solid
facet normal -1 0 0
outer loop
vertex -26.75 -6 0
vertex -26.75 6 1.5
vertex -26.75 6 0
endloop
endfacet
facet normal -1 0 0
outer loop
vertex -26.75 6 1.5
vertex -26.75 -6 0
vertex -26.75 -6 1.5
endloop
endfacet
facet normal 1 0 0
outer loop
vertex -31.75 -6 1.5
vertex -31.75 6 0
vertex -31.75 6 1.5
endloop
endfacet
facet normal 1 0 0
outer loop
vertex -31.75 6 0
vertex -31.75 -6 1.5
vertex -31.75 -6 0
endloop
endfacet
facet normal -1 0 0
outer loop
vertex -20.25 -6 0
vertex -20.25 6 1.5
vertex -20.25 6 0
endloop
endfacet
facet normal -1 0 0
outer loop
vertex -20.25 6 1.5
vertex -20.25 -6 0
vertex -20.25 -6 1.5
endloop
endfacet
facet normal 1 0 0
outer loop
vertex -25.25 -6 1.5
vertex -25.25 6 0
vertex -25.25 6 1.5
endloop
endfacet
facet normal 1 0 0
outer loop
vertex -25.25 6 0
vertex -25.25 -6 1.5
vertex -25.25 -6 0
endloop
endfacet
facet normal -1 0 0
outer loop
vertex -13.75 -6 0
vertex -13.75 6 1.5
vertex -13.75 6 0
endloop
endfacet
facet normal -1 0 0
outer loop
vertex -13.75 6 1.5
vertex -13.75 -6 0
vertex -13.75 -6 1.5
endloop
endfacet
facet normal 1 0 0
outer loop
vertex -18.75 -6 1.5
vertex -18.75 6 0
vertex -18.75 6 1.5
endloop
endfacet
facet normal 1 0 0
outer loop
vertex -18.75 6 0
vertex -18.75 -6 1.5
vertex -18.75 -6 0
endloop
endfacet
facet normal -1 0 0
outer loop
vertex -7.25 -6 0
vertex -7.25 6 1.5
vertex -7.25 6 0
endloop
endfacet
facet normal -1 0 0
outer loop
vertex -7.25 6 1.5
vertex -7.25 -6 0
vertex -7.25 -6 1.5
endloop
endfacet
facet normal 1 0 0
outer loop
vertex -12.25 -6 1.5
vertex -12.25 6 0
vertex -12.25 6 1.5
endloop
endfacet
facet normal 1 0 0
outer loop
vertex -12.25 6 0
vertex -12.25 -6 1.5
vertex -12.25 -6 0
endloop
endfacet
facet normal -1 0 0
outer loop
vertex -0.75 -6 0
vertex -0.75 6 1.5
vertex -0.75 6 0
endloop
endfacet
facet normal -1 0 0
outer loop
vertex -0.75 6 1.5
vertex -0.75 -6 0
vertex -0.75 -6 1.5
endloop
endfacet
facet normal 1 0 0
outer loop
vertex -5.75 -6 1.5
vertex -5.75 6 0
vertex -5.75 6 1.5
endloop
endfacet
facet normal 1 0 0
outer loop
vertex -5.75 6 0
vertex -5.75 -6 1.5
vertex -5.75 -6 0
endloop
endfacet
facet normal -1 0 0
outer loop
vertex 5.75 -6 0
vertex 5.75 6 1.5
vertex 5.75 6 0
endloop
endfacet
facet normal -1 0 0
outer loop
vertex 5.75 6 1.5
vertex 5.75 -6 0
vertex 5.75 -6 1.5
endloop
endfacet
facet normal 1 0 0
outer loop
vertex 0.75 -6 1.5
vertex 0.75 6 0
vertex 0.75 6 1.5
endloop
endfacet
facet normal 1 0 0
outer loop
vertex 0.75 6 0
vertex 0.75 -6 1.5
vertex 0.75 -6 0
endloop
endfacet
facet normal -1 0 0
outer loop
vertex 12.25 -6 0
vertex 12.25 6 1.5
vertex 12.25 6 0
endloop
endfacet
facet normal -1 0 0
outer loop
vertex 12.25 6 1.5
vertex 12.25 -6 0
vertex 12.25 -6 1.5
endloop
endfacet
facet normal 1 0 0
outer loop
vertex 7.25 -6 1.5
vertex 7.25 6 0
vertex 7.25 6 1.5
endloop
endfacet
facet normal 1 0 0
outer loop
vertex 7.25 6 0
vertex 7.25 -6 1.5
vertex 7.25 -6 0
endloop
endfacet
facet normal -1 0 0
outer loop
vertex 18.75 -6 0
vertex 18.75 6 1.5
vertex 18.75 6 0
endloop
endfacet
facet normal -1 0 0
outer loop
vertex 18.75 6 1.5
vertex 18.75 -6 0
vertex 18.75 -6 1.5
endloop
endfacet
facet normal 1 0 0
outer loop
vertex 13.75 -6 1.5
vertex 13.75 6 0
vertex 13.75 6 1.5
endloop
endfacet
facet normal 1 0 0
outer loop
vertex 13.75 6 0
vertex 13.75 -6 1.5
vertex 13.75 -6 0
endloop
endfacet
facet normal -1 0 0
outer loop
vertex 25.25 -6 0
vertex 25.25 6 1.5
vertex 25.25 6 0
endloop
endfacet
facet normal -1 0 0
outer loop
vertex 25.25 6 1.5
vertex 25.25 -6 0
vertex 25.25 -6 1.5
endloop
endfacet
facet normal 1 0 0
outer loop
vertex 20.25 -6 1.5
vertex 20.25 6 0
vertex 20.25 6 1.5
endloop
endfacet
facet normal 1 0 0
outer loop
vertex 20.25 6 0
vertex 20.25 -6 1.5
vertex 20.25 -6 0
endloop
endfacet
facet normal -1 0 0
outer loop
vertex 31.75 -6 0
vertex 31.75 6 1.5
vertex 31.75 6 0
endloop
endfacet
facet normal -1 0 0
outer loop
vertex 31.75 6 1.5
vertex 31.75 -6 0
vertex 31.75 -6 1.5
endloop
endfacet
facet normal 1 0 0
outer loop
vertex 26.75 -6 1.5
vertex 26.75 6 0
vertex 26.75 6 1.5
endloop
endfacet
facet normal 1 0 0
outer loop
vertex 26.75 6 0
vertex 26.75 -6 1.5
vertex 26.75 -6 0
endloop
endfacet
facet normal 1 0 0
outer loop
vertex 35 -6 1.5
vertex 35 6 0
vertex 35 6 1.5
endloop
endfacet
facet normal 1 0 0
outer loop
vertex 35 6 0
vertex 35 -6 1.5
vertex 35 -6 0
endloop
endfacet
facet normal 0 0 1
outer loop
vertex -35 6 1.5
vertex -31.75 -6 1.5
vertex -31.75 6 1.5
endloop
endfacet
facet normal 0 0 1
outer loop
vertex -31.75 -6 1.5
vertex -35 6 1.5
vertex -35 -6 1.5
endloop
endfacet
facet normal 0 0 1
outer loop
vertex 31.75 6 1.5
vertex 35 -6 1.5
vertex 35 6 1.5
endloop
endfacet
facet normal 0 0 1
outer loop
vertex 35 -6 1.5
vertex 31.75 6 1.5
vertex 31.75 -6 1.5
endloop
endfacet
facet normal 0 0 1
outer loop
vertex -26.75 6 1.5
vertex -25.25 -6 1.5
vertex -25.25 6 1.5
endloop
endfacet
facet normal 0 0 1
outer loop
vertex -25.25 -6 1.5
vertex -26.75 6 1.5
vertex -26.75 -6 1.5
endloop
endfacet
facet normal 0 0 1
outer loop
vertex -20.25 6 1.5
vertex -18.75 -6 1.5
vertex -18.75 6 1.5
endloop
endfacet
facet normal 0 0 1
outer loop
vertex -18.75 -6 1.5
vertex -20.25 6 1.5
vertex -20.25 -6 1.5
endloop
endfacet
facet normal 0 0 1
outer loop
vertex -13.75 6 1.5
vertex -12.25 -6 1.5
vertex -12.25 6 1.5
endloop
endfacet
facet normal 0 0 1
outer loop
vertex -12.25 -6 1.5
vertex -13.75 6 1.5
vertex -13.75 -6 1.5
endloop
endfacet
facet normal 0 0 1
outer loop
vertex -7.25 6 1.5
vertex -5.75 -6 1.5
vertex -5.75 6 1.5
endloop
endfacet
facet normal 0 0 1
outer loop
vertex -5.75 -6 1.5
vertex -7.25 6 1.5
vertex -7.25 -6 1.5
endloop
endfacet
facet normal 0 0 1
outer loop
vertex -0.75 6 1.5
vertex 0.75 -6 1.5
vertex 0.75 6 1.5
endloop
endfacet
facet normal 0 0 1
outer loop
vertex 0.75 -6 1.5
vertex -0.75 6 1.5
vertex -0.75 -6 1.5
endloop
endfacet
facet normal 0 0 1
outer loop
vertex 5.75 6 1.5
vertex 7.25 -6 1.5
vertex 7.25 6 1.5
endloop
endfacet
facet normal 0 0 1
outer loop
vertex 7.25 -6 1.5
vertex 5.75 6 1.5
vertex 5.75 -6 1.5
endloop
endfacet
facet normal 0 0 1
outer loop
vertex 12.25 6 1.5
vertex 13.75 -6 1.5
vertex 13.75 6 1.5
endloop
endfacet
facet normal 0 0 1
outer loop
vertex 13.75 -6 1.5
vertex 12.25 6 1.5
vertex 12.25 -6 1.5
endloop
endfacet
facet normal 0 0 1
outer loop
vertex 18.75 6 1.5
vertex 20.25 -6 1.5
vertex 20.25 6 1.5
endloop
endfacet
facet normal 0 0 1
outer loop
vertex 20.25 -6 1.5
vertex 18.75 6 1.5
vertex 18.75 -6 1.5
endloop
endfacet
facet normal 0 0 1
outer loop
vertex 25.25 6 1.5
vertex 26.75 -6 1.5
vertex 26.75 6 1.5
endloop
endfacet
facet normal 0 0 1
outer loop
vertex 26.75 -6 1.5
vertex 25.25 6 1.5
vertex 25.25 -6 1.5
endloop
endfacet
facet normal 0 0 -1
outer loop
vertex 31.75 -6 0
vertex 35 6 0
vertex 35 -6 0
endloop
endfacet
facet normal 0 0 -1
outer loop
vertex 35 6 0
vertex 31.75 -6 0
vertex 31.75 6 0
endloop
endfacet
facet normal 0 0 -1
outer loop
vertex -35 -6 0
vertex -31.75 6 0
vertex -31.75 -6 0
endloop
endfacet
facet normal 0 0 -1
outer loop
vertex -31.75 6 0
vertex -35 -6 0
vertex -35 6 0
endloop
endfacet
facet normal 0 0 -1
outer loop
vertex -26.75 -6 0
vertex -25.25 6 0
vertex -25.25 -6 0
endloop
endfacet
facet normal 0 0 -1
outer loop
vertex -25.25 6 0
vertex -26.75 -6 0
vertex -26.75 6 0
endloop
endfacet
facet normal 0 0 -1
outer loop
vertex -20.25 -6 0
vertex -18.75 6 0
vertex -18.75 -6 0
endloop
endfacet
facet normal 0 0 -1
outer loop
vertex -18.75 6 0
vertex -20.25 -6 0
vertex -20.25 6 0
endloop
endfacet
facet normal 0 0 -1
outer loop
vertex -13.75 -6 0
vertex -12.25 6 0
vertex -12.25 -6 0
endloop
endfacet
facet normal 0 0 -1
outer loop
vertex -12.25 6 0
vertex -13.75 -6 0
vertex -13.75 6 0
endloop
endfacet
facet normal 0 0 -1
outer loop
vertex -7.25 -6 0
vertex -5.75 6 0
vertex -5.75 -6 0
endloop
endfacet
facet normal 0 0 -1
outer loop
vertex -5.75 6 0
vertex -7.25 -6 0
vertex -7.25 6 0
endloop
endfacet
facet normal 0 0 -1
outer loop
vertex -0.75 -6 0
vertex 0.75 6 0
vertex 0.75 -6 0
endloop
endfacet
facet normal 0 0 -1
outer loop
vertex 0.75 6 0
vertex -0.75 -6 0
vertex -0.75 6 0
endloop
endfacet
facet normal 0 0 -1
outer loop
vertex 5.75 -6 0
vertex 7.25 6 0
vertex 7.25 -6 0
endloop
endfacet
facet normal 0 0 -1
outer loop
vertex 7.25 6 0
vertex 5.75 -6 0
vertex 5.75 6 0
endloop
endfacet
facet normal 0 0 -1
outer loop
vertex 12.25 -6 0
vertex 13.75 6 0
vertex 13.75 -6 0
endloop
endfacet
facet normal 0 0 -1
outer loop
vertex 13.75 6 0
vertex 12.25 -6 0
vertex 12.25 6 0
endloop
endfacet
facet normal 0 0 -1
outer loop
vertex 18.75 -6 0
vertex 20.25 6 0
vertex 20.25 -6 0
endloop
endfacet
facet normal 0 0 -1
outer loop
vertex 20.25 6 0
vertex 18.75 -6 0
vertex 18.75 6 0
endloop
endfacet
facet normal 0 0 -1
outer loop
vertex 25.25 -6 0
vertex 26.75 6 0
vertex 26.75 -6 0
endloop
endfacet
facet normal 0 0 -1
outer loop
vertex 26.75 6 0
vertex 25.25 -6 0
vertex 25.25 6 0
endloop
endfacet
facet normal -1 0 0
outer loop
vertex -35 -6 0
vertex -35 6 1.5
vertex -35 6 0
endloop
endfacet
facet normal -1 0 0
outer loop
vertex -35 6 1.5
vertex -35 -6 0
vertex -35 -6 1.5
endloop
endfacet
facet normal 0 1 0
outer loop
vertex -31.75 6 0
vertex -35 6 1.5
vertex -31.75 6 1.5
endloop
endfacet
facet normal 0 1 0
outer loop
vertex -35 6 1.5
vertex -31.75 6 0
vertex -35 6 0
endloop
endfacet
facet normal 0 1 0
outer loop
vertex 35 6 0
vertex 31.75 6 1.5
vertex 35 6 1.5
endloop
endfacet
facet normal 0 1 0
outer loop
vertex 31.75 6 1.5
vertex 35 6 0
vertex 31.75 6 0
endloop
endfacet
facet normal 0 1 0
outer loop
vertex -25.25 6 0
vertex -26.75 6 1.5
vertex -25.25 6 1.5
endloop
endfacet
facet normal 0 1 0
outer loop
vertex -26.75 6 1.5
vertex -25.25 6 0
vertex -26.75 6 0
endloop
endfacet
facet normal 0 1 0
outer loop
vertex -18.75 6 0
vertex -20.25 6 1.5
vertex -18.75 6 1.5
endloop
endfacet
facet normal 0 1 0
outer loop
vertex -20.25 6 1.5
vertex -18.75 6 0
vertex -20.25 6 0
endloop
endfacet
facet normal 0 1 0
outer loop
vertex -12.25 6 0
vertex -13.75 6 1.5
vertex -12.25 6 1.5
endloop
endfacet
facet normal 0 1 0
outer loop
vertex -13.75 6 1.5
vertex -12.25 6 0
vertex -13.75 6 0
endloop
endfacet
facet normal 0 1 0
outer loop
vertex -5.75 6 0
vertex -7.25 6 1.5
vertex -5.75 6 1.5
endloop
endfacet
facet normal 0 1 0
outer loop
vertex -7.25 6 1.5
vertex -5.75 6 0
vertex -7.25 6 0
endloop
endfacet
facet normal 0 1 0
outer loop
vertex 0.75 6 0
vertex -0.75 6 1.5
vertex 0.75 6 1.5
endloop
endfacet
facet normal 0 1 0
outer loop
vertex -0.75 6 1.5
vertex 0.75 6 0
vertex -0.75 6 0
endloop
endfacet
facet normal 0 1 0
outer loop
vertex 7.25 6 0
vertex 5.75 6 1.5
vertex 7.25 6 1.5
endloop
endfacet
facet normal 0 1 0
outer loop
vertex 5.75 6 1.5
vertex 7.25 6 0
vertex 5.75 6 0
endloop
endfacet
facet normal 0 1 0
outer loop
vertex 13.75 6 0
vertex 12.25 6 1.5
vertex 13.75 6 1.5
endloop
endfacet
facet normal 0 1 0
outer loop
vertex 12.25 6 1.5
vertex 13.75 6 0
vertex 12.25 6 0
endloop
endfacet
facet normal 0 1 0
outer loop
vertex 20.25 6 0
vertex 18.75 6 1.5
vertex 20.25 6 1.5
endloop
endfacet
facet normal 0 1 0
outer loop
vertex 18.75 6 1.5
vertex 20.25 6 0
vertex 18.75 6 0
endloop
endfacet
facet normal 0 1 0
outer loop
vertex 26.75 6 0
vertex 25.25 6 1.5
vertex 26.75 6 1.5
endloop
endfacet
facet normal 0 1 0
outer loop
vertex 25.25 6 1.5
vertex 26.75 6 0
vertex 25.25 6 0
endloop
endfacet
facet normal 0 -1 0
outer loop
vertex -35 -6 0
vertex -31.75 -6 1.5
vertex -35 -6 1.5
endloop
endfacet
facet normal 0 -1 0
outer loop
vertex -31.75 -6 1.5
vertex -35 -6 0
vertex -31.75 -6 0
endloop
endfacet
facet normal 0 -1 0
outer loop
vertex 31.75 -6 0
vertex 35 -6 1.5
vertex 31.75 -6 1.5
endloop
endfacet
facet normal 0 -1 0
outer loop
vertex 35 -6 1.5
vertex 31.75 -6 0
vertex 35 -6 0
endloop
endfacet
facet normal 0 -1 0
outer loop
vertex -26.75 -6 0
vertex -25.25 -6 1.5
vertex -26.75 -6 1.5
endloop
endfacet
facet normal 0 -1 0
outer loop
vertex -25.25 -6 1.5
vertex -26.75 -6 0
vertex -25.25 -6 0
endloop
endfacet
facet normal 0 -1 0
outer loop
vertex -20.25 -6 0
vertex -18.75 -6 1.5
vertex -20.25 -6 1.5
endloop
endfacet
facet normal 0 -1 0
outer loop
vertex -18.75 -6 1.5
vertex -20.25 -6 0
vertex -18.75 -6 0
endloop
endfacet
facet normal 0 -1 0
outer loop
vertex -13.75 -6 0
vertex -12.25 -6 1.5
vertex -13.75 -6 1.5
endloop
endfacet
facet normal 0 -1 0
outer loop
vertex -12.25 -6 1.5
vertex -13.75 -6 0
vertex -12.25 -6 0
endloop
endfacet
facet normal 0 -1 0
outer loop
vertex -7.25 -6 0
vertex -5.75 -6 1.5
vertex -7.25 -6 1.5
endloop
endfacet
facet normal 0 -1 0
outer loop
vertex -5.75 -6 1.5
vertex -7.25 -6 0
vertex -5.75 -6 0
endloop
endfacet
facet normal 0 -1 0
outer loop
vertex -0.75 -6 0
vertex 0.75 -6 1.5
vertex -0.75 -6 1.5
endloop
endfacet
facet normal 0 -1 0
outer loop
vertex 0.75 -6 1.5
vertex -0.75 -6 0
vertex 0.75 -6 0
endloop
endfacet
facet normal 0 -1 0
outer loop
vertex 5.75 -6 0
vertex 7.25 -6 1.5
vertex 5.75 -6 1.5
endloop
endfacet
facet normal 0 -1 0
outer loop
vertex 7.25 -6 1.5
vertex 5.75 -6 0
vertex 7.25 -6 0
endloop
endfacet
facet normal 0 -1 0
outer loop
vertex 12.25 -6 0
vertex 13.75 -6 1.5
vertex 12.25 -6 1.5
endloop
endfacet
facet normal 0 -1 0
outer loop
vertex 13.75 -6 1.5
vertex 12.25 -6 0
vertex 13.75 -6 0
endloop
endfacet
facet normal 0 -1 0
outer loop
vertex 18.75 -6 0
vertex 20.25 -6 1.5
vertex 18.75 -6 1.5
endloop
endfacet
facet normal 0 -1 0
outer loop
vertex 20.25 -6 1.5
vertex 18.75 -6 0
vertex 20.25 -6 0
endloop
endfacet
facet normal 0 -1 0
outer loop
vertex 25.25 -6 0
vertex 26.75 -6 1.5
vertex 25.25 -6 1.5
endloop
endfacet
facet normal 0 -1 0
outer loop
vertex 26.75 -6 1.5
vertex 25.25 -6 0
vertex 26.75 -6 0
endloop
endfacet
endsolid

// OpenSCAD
// 10-well comb for casting agarose gels
// Print orientation: flat on bed, teeth pointing down (-Y)

$fn = 64;

// ---- Dimensions (mm) ----
plate_t      = 1.5;   // plate thickness (Z)
spine_l      = 70;    // spine length (X)
spine_w      = 12;    // spine width (Y)
tooth_n      = 10;    // number of teeth
tooth_w      = 5.0;   // tooth width (X)
tooth_l      = 12;    // tooth length (Y)
gap          = 1.5;   // gap between teeth (X)
eps          = 0.5;   // cutter overshoot past faces (Z)

// ---- Derived ----
pitch   = tooth_w + gap;            // centre-to-centre spacing
x_start = -(tooth_n - 1) * pitch / 2;  // first tooth centre (row centred)

// ---- Model ----
difference() {
    // Base plate
    translate([-spine_l/2, -spine_w/2, 0])
        cube([spine_l, spine_w, plate_t]);

    // Teeth cut from the plate
    for (i = [0 : tooth_n - 1])
        translate([x_start + i * pitch - tooth_w/2,
                   -tooth_l/2 - eps,
                   -eps])
            cube([tooth_w, tooth_l + 2*eps, plate_t + 2*eps]);
}
